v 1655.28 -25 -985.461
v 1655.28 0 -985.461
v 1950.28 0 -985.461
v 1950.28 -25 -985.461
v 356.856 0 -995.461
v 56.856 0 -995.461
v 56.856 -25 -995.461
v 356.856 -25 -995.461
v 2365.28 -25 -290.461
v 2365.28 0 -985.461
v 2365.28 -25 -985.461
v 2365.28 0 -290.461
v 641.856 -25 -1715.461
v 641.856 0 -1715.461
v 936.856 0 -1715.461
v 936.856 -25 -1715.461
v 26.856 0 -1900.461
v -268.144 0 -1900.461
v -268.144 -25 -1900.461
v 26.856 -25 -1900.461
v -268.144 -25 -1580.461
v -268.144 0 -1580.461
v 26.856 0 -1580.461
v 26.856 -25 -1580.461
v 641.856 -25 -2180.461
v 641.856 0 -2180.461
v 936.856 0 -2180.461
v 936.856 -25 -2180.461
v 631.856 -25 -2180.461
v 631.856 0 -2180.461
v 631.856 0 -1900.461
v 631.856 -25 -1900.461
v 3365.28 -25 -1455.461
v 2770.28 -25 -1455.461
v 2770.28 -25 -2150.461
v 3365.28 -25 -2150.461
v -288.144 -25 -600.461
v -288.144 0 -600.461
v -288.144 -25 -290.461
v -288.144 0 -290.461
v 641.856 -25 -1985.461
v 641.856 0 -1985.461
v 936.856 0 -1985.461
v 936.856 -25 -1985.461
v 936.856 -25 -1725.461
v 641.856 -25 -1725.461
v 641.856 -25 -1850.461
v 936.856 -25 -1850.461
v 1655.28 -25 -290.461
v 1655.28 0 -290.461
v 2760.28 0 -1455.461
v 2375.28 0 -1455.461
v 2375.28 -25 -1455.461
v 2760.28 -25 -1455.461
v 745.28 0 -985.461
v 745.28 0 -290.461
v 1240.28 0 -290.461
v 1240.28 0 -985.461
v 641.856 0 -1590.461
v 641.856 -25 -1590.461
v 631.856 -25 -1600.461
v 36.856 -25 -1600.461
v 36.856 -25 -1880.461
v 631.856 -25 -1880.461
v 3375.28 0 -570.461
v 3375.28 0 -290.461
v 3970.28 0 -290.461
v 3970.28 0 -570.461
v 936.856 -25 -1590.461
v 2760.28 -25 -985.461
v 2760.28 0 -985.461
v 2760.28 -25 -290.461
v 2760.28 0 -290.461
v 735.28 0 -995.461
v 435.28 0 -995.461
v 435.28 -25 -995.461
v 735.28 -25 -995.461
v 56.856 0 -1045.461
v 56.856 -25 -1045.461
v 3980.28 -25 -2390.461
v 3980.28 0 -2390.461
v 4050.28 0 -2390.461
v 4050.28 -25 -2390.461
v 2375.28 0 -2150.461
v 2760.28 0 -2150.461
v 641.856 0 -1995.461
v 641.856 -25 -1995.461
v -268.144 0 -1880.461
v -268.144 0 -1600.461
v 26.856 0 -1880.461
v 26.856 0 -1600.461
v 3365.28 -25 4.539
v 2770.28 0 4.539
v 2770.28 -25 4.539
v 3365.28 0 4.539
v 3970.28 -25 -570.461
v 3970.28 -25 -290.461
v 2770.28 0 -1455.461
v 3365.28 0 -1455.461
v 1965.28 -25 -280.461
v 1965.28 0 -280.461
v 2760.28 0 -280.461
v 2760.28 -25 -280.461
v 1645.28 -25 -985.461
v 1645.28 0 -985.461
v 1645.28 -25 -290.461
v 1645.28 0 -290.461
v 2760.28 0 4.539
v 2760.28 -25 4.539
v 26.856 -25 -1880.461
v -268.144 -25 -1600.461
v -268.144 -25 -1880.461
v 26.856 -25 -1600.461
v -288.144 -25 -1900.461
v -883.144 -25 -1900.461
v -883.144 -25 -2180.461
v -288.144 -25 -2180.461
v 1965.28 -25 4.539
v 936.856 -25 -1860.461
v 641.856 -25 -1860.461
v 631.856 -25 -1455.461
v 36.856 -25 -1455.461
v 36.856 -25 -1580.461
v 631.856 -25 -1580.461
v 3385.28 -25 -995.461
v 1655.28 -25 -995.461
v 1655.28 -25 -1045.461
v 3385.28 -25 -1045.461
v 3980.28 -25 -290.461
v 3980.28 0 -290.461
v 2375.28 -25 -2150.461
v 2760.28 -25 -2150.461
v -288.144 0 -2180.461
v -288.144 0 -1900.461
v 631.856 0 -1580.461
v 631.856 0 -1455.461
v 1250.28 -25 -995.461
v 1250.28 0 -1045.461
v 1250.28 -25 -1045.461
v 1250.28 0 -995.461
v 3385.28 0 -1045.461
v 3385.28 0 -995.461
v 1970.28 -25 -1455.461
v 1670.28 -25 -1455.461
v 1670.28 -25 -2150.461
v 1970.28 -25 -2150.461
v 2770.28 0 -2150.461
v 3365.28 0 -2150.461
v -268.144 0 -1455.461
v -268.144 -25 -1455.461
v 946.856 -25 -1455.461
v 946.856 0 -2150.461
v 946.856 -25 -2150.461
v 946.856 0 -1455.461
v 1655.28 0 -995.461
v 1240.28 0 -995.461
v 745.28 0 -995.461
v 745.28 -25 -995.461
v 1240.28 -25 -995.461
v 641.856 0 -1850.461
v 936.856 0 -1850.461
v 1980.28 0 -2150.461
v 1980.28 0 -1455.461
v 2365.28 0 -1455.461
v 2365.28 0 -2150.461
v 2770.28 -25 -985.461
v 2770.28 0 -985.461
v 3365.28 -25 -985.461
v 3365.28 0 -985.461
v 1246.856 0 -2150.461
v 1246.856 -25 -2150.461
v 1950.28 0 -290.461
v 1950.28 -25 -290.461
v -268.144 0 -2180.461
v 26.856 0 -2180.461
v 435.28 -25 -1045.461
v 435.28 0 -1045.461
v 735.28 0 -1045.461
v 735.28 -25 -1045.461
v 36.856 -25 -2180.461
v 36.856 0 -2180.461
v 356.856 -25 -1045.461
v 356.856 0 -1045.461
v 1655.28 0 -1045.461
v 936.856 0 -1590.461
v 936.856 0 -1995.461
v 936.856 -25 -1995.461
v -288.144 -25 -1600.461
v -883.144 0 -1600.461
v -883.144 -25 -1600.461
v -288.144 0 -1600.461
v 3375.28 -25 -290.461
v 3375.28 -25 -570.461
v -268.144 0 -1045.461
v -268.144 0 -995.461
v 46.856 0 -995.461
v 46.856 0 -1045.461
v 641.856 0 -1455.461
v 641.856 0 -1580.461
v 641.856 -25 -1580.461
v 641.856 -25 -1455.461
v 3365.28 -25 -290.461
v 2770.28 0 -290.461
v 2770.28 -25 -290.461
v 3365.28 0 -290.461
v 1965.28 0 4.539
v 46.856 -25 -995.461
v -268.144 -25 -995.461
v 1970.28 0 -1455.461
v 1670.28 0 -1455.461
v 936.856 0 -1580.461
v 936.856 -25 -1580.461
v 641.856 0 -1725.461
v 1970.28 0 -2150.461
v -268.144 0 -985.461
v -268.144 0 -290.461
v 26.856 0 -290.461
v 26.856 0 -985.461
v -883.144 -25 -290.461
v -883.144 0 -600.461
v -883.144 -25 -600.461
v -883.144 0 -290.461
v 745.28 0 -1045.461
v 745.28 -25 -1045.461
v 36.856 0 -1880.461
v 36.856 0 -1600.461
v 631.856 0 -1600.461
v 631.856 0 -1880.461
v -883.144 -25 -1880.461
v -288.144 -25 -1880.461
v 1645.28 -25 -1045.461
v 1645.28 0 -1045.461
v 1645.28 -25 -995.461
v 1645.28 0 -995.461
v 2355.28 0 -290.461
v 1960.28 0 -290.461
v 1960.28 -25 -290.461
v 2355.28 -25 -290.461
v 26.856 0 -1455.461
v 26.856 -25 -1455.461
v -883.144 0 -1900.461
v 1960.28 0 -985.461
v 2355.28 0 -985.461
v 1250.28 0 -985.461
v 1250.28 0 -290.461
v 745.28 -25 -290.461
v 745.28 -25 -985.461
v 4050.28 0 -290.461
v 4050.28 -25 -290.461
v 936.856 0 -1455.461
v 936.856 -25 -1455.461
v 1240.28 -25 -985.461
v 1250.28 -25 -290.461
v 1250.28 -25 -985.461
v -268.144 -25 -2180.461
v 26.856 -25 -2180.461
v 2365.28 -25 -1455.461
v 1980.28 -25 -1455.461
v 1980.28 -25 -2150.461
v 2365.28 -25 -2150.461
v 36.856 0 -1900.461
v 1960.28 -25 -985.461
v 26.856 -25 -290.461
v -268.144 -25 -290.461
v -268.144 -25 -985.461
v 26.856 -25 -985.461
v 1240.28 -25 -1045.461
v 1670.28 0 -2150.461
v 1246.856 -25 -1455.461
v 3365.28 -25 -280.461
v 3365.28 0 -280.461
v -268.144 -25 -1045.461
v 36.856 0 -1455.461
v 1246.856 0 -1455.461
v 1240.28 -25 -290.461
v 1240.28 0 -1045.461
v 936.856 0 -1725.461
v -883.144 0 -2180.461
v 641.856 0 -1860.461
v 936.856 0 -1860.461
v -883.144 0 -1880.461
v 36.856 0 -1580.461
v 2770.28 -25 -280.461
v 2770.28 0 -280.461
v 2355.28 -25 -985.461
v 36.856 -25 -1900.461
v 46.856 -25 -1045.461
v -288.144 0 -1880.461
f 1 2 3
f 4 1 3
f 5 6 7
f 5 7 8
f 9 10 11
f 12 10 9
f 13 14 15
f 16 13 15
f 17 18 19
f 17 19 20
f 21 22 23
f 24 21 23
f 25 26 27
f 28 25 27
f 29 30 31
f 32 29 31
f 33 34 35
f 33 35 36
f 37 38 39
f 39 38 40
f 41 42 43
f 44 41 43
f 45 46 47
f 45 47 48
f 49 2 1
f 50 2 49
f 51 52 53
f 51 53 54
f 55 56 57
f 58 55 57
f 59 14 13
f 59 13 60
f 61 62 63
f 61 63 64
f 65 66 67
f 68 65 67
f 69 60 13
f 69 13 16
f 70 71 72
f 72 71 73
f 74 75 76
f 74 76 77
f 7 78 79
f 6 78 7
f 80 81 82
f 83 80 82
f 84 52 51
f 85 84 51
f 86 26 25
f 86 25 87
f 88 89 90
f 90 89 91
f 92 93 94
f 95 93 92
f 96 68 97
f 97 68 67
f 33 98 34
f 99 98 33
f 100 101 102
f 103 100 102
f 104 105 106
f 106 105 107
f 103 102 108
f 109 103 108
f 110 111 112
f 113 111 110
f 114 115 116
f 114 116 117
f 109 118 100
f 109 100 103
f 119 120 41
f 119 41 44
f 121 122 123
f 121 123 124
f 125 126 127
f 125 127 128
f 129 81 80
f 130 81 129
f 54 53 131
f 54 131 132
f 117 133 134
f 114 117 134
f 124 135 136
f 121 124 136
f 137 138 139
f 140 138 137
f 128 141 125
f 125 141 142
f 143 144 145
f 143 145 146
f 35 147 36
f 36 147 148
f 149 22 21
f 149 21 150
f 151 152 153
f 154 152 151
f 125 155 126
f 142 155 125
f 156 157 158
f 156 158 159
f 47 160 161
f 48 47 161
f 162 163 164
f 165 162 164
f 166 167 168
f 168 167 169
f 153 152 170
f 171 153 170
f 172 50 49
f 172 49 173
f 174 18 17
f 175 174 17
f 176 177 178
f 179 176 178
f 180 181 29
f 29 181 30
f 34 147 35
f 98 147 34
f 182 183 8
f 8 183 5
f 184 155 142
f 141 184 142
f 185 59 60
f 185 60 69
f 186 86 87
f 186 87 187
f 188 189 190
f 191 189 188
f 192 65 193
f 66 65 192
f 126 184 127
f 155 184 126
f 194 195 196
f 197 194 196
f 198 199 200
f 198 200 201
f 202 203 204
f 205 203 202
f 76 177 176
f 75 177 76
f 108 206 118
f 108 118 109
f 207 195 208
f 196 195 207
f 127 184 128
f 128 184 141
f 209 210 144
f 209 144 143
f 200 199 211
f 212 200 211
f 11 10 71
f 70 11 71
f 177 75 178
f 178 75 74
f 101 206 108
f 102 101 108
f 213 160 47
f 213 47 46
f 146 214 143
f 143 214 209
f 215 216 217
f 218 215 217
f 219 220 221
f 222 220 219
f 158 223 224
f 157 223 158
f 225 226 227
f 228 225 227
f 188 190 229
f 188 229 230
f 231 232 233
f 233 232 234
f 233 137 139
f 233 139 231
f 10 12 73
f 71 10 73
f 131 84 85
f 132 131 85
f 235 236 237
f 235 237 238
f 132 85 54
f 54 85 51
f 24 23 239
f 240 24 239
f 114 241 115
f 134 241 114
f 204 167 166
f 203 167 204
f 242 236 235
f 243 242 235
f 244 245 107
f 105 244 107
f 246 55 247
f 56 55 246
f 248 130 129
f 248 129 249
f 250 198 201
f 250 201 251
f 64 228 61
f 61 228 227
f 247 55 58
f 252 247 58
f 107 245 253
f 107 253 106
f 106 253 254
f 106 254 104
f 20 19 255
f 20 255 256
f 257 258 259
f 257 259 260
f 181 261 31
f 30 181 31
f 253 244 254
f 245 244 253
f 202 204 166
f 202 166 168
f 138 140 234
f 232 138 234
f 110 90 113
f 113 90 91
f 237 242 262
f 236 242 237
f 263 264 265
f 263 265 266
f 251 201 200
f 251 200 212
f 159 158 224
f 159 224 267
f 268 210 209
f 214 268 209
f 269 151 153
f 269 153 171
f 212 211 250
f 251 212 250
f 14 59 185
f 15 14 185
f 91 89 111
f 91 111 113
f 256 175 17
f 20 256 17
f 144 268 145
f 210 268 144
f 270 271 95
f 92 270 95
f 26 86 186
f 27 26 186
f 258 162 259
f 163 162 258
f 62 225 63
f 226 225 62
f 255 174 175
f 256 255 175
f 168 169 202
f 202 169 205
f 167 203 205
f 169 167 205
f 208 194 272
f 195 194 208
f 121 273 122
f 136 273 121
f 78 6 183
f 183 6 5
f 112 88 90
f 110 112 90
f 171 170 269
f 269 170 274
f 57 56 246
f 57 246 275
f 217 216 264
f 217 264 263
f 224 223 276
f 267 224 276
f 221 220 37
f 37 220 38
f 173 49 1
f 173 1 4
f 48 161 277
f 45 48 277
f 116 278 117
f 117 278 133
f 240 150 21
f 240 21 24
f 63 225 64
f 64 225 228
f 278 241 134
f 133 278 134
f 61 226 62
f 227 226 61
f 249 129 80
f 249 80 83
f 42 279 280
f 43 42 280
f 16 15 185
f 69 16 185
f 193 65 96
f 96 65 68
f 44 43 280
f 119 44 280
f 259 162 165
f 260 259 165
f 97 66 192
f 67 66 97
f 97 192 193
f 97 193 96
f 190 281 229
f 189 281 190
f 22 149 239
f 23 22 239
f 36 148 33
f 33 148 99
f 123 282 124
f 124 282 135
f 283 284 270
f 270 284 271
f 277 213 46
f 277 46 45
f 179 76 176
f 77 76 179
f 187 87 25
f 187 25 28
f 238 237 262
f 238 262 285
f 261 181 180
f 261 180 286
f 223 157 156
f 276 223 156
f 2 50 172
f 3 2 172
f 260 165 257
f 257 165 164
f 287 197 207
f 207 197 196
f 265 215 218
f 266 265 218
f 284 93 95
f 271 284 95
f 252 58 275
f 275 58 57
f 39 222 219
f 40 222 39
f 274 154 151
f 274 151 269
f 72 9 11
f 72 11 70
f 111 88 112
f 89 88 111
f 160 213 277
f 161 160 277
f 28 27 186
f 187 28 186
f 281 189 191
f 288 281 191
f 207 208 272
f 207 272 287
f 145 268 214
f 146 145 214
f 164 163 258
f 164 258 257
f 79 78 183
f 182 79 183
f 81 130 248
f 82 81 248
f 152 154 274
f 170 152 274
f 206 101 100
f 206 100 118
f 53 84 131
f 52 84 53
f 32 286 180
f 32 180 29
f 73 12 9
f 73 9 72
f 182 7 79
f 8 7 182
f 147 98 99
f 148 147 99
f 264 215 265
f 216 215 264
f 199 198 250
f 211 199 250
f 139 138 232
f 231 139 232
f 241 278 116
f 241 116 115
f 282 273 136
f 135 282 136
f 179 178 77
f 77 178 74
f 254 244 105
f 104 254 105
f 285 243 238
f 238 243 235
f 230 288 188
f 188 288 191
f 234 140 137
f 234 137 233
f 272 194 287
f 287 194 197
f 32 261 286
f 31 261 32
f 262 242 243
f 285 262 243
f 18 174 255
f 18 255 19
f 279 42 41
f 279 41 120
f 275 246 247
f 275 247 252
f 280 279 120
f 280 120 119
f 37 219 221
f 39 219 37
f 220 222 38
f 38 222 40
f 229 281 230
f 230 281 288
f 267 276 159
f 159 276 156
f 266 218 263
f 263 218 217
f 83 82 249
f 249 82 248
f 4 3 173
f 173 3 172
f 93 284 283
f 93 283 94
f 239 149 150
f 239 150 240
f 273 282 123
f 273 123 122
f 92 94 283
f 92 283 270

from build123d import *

# Parameters (mm, degrees)
F1_W     = 295
F1_H     = 695
F1_W_2   = 395
F1_W_3   = 595
F1_H_2   = 280
F1_H_3   = 285
F1_W_4   = 795
F1_W_5   = 70
F1_H_4   = 2100
F1_W_6   = 1730
F1_H_5   = 50
F1_W_7   = 300
F1_W_8   = 385
F0_W     = 595
F0_H     = 310
F0_H_2   = 280
F0_W_2   = 295
F0_H_3   = 695
F0_H_4   = 125
F0_W_3   = 300
F0_H_5   = 50
F0_W_4   = 315
F0_H_6   = 185
F0_W_5   = 495
F0_W_6   = 395
F2_DEPTH = 25


with BuildPart() as f2:
    # F1 (on Front) + F0 (on Front) → F2 (new body)
    with BuildSketch(Plane.XZ):
        with Locations((1802.780025, -637.96078)):
            Rectangle(F1_W, F1_H)
        with Locations((2157.780025, -637.96078)):
            Rectangle(F1_W_2, F1_H)
        with Locations((2562.780025, -637.96078)):
            Rectangle(F1_W_2, F1_H)
        with Locations((3067.780025, -637.96078)):
            Rectangle(F1_W_3, F1_H)
        with Locations((3672.780025, -430.46078)):
            Rectangle(F1_W_3, F1_H_2)
        with Locations((3067.780025, -137.96078)):
            Rectangle(F1_W_3, F1_H_3)
        with Locations((2362.780025, -137.96078)):
            Rectangle(F1_W_4, F1_H_3)
        with Locations((4015.280025, -1340.46078)):
            Rectangle(F1_W_5, F1_H_4)
        with Locations((2520.280025, -1020.46078)):
            Rectangle(F1_W_6, F1_H_5)
        with Locations((1820.280025, -1802.96078)):
            Rectangle(F1_W_7, F1_H)
        with Locations((2172.780025, -1802.96078)):
            Rectangle(F1_W_8, F1_H)
        with Locations((2567.780025, -1802.96078)):
            Rectangle(F1_W_8, F1_H)
        with Locations((3067.780025, -1802.96078)):
            Rectangle(F1_W_3, F1_H)
    with BuildSketch(Plane.XZ):
        with Locations((-585.64358, -445.46078)):
            Rectangle(F0_W, F0_H)
        with Locations((-585.64358, -1740.46078)):
            Rectangle(F0_W, F0_H_2)
        with Locations((-585.64358, -2040.46078)):
            Rectangle(F0_W, F0_H_2)
        with Locations((-120.64358, -637.96078)):
            Rectangle(F0_W_2, F0_H_3)
        with Locations((-120.64358, -1740.46078)):
            Rectangle(F0_W_2, F0_H_2)
        with Locations((-120.64358, -2040.46078)):
            Rectangle(F0_W_2, F0_H_2)
        with Locations((-120.64358, -1517.96078)):
            Rectangle(F0_W_2, F0_H_4)
        with Locations((334.35642, -1517.96078)):
            Rectangle(F0_W, F0_H_4)
        with Locations((334.35642, -1740.46078)):
            Rectangle(F0_W, F0_H_2)
        with Locations((334.35642, -2040.46078)):
            Rectangle(F0_W, F0_H_2)
        with Locations((206.85642, -1020.46078)):
            Rectangle(F0_W_3, F0_H_5)
        with Locations((-110.64358, -1020.46078)):
            Rectangle(F0_W_4, F0_H_5)
        with Locations((789.35642, -1517.96078)):
            Rectangle(F0_W_2, F0_H_4)
        with Locations((789.35642, -1787.96078)):
            Rectangle(F0_W_2, F0_H_4)
        with Locations((789.35642, -1922.96078)):
            Rectangle(F0_W_2, F0_H_4)
        with Locations((789.35642, -2087.96078)):
            Rectangle(F0_W_2, F0_H_6)
        with Locations((789.35642, -1652.96078)):
            Rectangle(F0_W_2, F0_H_4)
        with Locations((992.780025, -637.96078)):
            Rectangle(F0_W_5, F0_H_3)
        with Locations((992.780025, -1020.46078)):
            Rectangle(F0_W_5, F0_H_5)
        with Locations((585.280025, -1020.46078)):
            Rectangle(F0_W_3, F0_H_5)
        with Locations((1447.780025, -637.96078)):
            Rectangle(F0_W_6, F0_H_3)
        with Locations((1447.780025, -1020.46078)):
            Rectangle(F0_W_6, F0_H_5)
        with Locations((1096.85642, -1802.96078)):
            Rectangle(F0_W_3, F0_H_3)
    extrude(amount=F2_DEPTH)


solid = f2.part
